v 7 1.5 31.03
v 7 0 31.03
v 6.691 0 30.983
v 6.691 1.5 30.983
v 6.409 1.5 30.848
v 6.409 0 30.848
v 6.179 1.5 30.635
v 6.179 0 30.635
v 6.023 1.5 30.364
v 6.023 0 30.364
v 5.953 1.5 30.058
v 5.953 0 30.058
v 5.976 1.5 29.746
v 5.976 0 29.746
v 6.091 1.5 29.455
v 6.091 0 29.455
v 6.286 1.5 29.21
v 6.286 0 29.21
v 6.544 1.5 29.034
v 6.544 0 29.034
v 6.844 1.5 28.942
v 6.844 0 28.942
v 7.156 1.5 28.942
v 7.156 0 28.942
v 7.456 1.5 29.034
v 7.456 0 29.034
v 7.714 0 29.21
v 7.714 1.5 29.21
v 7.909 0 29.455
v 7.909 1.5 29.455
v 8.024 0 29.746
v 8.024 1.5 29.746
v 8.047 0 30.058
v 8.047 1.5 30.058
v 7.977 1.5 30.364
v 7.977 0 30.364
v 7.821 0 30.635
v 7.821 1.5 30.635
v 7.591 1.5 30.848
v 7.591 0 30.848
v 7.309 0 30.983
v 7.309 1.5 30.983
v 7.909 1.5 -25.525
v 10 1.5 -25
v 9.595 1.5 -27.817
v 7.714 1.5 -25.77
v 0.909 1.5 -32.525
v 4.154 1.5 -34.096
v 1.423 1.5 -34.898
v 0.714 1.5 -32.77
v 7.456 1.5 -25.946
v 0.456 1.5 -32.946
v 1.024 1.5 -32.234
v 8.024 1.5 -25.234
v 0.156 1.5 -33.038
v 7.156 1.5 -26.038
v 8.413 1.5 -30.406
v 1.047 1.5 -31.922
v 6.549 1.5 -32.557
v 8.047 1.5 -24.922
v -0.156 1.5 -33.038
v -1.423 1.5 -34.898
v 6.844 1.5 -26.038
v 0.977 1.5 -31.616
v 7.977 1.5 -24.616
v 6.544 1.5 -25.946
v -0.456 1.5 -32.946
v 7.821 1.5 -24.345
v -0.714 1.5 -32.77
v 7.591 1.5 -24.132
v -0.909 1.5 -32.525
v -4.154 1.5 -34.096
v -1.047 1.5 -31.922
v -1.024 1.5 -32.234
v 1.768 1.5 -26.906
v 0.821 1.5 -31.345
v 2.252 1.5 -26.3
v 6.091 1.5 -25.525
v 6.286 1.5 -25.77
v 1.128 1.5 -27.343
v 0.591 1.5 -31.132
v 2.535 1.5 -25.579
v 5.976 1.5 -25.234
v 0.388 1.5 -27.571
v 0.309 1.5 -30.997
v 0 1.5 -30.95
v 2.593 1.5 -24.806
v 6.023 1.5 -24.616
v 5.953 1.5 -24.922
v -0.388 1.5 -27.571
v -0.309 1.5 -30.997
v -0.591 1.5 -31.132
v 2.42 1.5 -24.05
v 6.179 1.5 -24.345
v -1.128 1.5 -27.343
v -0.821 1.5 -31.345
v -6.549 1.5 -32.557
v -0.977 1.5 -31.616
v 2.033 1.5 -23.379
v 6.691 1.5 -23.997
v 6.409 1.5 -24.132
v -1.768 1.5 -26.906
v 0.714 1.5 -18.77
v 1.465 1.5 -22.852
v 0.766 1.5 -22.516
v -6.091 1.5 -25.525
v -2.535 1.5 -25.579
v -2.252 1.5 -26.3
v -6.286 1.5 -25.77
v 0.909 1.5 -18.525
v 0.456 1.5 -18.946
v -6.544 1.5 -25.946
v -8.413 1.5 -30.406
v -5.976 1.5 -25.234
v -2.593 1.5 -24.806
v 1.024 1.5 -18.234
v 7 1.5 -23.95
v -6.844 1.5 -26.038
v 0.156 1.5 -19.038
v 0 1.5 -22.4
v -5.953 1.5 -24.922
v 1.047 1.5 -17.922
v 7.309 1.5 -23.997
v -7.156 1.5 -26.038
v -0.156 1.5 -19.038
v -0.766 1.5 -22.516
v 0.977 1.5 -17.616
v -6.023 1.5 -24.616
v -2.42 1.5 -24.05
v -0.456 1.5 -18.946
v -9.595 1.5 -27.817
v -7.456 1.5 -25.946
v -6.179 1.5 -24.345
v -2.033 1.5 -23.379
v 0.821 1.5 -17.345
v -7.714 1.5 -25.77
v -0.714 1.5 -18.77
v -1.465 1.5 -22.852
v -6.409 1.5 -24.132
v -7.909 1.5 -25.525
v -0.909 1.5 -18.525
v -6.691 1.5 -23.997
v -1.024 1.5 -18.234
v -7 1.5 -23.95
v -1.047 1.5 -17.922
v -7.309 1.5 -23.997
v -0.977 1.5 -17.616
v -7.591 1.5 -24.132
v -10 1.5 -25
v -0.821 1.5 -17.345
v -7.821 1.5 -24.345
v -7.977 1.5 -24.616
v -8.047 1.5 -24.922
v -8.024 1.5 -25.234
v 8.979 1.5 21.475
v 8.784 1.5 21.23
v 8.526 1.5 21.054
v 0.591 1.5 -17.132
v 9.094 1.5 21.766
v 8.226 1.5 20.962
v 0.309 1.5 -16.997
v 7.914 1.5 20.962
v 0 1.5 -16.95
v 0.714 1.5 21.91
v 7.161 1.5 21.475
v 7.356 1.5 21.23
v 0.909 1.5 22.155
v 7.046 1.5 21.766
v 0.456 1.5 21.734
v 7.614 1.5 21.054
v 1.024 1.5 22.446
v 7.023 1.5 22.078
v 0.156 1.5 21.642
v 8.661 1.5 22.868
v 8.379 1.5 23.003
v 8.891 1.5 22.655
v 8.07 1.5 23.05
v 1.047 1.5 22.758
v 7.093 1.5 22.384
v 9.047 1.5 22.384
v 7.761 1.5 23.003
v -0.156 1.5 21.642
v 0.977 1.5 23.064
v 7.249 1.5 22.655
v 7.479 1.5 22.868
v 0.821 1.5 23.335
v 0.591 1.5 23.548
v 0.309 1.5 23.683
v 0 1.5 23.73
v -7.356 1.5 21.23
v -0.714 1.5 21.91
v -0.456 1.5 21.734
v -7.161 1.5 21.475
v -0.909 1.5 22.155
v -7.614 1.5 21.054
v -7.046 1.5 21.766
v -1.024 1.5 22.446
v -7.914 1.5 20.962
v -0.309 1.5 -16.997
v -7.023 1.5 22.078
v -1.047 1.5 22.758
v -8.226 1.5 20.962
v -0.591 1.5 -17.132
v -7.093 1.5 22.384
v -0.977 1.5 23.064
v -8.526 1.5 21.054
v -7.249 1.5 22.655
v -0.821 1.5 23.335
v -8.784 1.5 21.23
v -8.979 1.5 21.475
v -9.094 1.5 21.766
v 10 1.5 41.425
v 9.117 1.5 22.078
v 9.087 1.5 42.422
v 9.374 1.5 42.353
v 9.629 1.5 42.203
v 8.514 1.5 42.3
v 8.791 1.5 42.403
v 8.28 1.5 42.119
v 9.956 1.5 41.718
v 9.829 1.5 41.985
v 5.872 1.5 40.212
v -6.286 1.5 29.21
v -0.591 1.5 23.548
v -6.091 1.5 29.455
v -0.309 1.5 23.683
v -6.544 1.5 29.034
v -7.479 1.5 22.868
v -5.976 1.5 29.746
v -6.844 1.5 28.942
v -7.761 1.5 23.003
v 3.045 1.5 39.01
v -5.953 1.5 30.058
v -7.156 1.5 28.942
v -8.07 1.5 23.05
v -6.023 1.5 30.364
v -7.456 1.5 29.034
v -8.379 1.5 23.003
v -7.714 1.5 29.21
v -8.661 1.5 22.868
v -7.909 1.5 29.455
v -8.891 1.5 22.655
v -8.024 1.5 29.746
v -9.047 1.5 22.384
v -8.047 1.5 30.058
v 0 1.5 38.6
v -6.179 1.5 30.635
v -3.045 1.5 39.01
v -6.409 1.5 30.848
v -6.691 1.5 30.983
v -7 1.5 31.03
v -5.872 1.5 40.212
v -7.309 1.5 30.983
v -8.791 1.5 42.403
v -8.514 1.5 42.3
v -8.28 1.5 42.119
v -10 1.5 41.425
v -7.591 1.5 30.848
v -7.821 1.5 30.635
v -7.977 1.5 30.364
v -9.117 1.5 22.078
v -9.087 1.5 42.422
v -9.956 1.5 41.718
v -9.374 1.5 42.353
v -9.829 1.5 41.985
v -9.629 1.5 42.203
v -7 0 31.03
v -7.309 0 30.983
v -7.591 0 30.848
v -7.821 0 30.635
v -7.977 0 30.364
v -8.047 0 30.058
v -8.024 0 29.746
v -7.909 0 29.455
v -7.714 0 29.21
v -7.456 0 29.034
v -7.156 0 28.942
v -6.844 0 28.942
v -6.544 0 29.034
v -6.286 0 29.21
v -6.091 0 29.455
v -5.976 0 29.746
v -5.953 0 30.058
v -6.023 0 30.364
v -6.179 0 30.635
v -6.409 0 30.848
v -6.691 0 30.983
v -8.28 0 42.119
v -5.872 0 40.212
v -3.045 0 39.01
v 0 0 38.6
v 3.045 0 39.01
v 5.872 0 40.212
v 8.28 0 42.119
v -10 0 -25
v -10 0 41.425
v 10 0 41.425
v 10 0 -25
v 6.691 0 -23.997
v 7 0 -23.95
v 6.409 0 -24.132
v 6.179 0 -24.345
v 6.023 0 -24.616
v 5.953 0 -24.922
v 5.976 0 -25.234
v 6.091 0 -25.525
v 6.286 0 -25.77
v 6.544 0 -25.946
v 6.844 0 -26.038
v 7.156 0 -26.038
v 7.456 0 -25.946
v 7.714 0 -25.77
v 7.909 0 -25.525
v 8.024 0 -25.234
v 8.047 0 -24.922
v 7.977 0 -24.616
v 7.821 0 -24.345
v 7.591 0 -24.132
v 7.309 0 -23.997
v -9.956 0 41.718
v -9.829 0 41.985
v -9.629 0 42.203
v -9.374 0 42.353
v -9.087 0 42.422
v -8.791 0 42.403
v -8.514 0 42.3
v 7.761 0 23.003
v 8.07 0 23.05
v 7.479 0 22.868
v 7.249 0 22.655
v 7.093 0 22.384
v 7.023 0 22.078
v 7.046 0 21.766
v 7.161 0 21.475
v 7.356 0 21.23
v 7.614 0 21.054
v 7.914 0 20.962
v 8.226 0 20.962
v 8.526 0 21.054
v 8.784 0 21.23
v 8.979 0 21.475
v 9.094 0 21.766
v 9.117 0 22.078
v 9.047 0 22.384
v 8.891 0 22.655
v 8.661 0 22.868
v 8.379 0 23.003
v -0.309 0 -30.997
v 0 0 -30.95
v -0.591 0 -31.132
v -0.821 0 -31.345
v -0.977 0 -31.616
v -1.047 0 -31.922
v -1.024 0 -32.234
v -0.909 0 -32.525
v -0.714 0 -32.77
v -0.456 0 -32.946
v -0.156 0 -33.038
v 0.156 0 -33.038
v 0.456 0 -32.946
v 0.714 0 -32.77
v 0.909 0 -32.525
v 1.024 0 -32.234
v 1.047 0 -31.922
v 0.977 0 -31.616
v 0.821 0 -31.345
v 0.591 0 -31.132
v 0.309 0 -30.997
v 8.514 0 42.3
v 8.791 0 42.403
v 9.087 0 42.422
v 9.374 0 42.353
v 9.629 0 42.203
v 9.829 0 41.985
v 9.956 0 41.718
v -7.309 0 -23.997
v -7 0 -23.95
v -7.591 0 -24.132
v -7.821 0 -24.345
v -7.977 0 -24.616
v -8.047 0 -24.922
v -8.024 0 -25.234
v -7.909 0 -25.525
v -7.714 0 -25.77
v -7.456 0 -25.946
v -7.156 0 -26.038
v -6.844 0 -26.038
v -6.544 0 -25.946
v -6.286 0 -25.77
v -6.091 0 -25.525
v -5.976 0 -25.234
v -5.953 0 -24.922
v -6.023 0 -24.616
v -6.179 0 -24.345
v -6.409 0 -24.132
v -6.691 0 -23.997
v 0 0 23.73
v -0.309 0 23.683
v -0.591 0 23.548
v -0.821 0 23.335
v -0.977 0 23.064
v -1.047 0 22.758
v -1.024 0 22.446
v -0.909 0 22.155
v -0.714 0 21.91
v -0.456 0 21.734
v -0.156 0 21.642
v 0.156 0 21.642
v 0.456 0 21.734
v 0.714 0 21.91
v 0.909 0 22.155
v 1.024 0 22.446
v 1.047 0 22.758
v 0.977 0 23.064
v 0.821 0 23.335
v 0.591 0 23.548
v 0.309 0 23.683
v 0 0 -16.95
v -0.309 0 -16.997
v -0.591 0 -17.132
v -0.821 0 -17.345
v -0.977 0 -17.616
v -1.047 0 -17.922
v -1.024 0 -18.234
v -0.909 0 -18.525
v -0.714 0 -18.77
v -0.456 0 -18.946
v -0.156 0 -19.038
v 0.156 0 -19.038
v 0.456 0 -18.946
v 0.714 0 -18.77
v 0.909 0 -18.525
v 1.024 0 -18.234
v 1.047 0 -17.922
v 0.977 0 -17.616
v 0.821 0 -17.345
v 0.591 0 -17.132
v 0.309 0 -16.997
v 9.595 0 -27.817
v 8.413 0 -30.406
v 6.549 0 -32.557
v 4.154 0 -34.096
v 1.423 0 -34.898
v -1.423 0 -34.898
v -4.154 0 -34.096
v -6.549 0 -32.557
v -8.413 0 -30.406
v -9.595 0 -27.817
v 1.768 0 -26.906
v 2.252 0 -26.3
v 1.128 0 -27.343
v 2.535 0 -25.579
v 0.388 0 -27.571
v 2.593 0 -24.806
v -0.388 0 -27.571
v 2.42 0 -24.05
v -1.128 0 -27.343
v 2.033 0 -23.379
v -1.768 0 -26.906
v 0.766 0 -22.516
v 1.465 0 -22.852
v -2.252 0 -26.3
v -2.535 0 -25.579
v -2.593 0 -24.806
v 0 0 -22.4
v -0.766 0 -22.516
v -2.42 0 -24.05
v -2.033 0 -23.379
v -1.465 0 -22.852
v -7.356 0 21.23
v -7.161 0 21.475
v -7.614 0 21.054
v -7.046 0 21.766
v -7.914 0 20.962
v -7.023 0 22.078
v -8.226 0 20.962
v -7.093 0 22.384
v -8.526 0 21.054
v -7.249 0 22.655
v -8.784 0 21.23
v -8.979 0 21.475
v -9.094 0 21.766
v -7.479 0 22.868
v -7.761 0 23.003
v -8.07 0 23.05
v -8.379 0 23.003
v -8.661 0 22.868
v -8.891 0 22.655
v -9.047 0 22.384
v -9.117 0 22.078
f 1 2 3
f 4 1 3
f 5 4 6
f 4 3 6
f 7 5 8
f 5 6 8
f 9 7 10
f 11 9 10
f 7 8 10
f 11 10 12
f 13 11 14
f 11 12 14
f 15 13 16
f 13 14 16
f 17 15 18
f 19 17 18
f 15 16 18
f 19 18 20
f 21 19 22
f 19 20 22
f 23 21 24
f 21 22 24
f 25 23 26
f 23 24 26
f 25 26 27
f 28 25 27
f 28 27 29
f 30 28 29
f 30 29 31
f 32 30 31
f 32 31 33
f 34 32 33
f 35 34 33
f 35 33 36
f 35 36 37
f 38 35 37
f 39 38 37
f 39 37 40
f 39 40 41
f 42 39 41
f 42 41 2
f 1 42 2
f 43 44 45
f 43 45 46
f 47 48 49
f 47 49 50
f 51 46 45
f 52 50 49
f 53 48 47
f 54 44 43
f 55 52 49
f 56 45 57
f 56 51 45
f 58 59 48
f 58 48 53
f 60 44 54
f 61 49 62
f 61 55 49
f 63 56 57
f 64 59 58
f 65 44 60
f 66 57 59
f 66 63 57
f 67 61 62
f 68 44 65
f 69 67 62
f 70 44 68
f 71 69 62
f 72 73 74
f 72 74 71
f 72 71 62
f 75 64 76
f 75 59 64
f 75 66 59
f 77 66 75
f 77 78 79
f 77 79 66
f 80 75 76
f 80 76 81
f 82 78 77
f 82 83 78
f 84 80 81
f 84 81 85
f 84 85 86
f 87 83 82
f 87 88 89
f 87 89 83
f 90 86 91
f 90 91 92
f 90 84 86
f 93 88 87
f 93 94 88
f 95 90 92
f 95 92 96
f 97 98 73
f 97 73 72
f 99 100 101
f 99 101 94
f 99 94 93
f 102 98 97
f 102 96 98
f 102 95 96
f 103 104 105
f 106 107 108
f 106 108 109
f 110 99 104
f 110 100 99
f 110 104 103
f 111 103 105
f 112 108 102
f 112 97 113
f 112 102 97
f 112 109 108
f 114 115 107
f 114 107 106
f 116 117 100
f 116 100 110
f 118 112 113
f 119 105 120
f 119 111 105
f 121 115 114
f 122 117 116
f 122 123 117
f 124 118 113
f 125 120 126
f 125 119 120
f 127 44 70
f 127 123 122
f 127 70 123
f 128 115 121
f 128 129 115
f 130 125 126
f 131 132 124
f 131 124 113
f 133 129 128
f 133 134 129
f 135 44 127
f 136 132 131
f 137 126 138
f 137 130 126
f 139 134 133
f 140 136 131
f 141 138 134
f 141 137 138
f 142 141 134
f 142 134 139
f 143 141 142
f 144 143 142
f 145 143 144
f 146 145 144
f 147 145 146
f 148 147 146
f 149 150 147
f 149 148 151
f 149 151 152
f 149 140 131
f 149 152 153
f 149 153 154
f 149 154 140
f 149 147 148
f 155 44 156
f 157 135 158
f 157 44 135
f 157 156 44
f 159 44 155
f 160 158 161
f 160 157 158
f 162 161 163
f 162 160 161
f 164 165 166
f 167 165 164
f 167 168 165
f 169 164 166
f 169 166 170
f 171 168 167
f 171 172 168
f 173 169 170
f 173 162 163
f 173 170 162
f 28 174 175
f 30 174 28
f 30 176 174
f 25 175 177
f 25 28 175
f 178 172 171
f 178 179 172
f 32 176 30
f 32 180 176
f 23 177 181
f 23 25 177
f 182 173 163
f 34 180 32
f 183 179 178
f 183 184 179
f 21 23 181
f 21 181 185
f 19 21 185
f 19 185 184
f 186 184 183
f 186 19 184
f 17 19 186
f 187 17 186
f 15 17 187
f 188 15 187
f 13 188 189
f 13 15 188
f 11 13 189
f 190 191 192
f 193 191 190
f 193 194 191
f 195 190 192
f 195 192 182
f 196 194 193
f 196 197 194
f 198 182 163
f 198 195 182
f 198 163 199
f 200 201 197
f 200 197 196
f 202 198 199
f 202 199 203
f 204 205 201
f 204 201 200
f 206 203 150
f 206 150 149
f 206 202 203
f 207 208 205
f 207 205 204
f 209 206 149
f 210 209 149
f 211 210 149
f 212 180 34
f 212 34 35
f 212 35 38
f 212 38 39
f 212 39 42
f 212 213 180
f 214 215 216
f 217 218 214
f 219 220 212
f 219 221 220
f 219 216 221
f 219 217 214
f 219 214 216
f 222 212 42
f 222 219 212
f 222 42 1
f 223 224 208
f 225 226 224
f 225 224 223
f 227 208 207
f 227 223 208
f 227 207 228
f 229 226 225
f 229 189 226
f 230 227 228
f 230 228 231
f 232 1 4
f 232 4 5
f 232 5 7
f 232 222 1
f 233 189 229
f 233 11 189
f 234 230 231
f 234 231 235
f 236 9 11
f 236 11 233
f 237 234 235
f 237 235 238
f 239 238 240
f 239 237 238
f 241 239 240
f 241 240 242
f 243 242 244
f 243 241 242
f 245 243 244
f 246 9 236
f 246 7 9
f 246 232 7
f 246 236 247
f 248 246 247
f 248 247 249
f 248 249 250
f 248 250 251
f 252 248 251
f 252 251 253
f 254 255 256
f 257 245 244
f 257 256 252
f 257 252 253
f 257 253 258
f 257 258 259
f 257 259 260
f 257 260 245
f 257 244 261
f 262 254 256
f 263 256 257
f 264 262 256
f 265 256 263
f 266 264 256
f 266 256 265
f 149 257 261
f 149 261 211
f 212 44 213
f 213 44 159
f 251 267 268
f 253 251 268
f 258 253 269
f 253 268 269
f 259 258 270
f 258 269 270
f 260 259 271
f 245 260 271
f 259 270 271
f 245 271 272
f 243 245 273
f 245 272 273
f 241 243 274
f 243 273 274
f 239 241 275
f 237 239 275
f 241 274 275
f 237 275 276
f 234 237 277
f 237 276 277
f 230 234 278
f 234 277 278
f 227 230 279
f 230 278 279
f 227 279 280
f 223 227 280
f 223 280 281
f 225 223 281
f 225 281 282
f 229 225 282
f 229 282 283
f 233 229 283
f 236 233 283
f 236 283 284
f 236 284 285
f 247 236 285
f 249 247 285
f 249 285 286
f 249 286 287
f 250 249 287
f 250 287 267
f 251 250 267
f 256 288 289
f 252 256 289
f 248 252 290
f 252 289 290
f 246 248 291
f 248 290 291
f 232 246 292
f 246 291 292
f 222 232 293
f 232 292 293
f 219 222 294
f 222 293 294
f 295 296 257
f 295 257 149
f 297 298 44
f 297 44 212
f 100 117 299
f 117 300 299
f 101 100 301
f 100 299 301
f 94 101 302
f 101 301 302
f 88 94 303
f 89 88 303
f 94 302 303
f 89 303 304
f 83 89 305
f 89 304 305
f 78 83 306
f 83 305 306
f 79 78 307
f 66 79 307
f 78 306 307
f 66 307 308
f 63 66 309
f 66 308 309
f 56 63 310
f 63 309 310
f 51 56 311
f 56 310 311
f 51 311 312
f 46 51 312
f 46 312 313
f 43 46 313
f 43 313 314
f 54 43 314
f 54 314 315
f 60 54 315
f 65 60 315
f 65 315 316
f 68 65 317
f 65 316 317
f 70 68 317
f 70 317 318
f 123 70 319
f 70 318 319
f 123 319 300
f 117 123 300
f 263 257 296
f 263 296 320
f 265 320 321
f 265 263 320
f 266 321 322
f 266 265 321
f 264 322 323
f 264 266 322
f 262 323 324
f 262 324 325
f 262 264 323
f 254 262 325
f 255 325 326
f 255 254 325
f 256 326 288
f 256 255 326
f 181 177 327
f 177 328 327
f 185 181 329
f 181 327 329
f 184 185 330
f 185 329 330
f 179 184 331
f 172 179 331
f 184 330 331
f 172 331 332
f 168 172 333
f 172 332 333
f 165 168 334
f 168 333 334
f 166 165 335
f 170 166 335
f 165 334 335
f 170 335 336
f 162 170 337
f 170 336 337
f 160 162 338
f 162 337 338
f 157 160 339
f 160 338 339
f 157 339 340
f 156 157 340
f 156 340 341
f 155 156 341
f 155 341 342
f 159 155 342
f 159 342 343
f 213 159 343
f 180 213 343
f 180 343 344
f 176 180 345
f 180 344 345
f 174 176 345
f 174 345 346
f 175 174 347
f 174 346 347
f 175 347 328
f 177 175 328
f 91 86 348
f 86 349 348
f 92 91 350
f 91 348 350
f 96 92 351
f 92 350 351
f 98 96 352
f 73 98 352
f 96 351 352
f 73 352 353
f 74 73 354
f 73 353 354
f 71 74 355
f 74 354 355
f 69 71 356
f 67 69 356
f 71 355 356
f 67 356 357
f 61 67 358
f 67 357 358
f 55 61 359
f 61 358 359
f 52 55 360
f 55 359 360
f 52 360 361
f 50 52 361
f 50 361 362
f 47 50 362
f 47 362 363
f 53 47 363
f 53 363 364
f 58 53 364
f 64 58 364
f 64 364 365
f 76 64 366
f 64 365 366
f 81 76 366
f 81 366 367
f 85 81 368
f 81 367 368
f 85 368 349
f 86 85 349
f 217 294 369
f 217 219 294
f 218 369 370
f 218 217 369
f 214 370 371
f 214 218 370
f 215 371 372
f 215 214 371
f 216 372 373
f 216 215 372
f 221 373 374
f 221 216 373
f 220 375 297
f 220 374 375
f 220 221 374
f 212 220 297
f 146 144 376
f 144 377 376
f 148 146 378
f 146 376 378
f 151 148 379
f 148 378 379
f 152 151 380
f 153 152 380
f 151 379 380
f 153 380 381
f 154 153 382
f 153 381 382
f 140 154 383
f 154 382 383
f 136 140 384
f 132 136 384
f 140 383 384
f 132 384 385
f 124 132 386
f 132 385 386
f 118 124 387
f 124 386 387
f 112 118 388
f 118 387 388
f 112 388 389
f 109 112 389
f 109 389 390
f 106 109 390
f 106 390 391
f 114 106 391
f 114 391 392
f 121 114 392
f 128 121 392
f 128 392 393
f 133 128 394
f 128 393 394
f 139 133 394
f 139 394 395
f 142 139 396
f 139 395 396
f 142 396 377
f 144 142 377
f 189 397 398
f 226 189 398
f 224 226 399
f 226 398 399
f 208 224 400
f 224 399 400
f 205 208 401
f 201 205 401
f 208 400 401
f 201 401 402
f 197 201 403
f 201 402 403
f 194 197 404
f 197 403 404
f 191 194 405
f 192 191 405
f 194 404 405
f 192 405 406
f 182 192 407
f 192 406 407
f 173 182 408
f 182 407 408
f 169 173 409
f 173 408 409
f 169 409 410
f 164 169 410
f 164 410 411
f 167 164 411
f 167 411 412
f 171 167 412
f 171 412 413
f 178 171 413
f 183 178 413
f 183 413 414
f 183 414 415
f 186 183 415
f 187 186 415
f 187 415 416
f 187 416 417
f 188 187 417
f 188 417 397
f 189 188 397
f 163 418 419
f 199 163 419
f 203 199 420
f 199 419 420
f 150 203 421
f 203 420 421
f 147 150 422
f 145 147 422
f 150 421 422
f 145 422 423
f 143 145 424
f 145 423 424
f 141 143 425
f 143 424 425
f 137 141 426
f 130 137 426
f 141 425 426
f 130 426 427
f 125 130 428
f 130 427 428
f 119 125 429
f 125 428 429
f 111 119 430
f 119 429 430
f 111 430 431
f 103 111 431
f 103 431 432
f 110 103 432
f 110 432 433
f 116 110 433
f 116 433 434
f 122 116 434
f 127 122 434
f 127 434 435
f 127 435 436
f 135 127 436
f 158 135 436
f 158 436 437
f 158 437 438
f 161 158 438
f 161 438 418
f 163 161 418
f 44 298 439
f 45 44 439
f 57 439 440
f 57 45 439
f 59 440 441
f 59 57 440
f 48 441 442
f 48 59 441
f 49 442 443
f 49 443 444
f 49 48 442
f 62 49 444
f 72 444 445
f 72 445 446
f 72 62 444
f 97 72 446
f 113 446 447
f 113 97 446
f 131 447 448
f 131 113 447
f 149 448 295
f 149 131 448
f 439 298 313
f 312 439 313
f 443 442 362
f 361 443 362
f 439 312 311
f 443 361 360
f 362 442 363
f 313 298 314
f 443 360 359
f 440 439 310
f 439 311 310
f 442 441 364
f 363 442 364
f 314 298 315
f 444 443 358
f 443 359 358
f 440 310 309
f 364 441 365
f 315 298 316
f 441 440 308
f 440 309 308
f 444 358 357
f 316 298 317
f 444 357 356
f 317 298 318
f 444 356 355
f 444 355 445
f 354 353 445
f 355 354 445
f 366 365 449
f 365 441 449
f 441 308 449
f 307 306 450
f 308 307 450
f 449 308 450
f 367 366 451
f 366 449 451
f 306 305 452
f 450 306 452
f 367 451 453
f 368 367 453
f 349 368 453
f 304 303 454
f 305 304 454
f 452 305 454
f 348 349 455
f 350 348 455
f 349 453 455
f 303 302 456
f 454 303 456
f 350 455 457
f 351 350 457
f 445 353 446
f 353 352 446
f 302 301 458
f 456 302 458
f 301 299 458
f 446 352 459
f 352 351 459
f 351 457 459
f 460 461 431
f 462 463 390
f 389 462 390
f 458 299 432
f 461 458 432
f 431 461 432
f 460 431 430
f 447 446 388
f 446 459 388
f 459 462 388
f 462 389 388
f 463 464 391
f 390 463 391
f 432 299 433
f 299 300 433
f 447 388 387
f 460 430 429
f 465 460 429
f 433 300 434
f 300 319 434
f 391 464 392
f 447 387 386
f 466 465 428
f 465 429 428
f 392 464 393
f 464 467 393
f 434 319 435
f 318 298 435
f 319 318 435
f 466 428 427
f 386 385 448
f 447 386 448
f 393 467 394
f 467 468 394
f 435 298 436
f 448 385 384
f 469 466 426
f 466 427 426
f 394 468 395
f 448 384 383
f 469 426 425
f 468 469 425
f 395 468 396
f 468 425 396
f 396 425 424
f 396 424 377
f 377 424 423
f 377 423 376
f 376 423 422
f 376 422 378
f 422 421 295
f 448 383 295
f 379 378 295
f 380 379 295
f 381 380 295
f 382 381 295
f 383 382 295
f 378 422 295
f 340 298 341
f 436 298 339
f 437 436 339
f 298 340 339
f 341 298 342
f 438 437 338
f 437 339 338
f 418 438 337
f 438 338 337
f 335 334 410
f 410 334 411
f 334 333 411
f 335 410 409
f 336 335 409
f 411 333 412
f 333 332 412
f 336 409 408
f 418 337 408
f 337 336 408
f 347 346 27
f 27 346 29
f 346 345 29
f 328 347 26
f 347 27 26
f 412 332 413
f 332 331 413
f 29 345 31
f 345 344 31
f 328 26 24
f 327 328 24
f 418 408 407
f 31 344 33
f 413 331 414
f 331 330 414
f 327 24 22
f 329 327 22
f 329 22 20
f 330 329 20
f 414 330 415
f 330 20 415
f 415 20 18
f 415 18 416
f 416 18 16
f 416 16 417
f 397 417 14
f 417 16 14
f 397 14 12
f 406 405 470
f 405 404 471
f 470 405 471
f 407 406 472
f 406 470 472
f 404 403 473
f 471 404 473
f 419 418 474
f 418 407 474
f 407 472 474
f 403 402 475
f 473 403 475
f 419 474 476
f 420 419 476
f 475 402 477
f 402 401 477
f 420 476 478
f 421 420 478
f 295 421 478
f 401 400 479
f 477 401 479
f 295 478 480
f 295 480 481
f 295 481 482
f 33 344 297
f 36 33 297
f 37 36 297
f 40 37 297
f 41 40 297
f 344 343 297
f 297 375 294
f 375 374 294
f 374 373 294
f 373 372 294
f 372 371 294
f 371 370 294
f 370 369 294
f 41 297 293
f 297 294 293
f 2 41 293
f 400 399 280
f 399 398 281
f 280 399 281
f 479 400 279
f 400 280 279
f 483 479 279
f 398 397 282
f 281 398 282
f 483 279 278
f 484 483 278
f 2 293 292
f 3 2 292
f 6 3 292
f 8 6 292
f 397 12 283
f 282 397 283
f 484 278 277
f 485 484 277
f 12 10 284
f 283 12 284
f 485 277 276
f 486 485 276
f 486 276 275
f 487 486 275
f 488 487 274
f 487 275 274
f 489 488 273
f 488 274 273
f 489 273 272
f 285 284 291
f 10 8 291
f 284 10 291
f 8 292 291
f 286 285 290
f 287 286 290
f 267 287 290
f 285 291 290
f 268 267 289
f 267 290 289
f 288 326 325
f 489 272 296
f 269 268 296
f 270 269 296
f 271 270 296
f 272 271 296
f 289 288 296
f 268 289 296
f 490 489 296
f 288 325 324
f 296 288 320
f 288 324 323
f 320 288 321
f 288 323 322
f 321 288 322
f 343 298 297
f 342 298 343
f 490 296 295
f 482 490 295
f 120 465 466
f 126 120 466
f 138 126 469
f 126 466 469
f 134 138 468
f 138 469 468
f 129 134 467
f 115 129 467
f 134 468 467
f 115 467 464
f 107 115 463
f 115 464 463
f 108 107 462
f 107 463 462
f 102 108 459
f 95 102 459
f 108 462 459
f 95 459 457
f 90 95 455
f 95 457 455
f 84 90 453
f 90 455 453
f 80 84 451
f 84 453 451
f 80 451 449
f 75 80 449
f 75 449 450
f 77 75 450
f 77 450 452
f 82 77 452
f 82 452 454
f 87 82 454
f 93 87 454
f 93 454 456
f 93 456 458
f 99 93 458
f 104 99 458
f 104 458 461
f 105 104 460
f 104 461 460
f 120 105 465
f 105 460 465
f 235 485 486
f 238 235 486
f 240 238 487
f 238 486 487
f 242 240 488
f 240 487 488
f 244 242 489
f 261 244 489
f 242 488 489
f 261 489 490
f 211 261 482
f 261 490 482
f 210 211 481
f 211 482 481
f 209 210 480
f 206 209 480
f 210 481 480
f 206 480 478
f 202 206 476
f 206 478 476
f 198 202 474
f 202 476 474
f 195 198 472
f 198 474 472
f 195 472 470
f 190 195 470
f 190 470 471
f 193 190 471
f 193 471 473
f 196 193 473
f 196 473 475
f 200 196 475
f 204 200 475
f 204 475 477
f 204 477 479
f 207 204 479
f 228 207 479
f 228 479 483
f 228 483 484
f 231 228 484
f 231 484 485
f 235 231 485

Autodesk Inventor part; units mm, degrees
ref_plane "YZ Plane" through (0, 0, 0) normal (1, 0, 0) x (0, 1, 0)
ref_plane "XZ Plane" through (0, 0, 0) normal (0, 1, 0) x (-1, 0, 0)
ref_plane "XY Plane" through (0, 0, 0) normal (0, 0, 1) x (1, 0, 0)
sketch "Sketch1" plane through (0, 0, 0) normal (0, 1, 0) x (-1, 0, 0)
  line L0 (10, -35) -> (-10, -35)
  line L1 (-10, -35) -> (-10, 44.4211)
  line L2 (10, 44.4211) -> (10, -35)
  arc A0 (-10, 44.4211) -> (10, 44.4211) centre (0, 50.1) ccw
  point P0 (0, 0)
  dimension "d2" = 35
  dimension "d3" = 10
  dimension "d36" = 23
  dimension "d37" = 85.1
  dimension "d39" = 79.4211
  dimension "d40" = 20
extrude "Plate1" add sketch "Sketch1" along normal blind 1.5
sketch "Sketch3" plane through (0, 1.5, 0) normal (0, 1, 0) x (1, 0, 0)
  circle A0 centre (0, 25) radius 10
  circle A1 centre (0, -25) radius 10
  line L0 (-10, 35) -> (10, 35) projected
  line L1 (10, -44) -> (-10, -44) projected
  line L2 (-10, 35) -> (10, 35)
  line L3 (10, 35) -> (10, 25)
  line L4 (10, 25) -> (-10, 25)
  line L5 (-10, 25) -> (-10, 35)
  line L6 (10, -35) -> (-10, -35)
  line L7 (-10, -35) -> (-10, -25)
  line L8 (-10, -25) -> (10, -25)
  line L9 (10, -25) -> (10, -44)
  point P0 (0, 0)
  point P1 (-10, -44.4211)
  point P2 (10, -25)
  point P3 (0, -35)
  point P4 (-10, -35)
  point P5 (0, 35)
  point P6 (10, 35)
  dimension "d12" = 20
  dimension "d13" = 20
  dimension "d14" = 10
  dimension "d15" = 10
  dimension "d16" = 25
  dimension "d17" = 25
  dimension "d18" = 10
extrude "Extrusion1" cut sketch "Sketch3" against normal blind 10 contours L5 L0 A0 | A0 L0 L3
sketch "Sketch4" plane through (0, 1.5, 0) normal (0, 1, 0) x (1, 0, 0)
  circle A0 centre (-7, 25) radius 0.8
  arc A1 (10, 25) -> (-10, 25) centre (0, 25) ccw projected
  circle A2 centre (0, 18) radius 0.8
  circle A3 centre (7, 25) radius 0.8
  circle A4 centre (0, 32) radius 0.8
  point P0 (0, 0)
  dimension "d21" = 0
  dimension "d22" = 7
  dimension "d23" = 1.6
  dimension "d26" = 360
hole "Hole2" at (0, 1.5, -32) at (7, 1.5, -25) at (0, 1.5, -18) at (-7, 1.5, -25) direction (0, -1, 0) diameter 2.1 depth 1.5
sketch "Sketch5" plane through (0, 1.5, 0) normal (0, 1, 0) x (1, 0, 0)
  arc A0 (10, 25) -> (-10, 25) centre (0, 25) ccw projected
  point P0 (0, 0)
hole "Hole3" at (0, 1.5, -25) direction (0, -1, 0) diameter 5.2 depth 1.5 clearance for "Hex Head Bolt" size "M5" standard "Ansi Metric M Profile"
fillet "Fillet1" radius 1 2 edges at (10, 0.75, 44.4211) (-10, 0.75, 44.4211)
sketch "Sketch7" plane through (0, 1.5, 0) normal (0, 1, 0) x (1, 0, 0)
  circle A0 centre (7, -29.98) radius 1.05
  circle A1 centre (8.07, -22) radius 1.05
  circle A2 centre (-7, -29.98) radius 1.05
  circle A3 centre (0, -22.68) radius 1.05
  circle A4 centre (-8.07, -22) radius 1.05
  point P0 (0, 0)
hole "Hole5" at (-8.07, 1.5, 22) at (0, 1.5, 22.68) at (8.07, 1.5, 22) at (7, 1.5, 29.98) at (-7, 1.5, 29.98) direction (0, -1, 0) diameter 2.1 end through all
equation "\"d33\" = Thickness"
equation "\"d46\" = Thickness"
equation "\"d61\" = Thickness"
equation "\"d4\" = Thickness"
equation "\"BendReliefWidth\" = Thickness"
equation "\"BendReliefDepth\" = 0.5 * Thickness"
equation "\"CornerReliefSize\" = 4 * Thickness"
equation "\"MinimumRemnant\" = 2 * Thickness"
equation "\"TransitionRadius\" = BendRadius"
equation "\"JacobiRadiusSize\" = BendRadius"
equation "\"GapSize\" = Thickness"
equation "\"Thickness\" = 1.5"
equation "\"BendRadius\" = 0.31"
properties part number "axis_8_10_connector_frame" material "Aluminum 6061-AHC"
